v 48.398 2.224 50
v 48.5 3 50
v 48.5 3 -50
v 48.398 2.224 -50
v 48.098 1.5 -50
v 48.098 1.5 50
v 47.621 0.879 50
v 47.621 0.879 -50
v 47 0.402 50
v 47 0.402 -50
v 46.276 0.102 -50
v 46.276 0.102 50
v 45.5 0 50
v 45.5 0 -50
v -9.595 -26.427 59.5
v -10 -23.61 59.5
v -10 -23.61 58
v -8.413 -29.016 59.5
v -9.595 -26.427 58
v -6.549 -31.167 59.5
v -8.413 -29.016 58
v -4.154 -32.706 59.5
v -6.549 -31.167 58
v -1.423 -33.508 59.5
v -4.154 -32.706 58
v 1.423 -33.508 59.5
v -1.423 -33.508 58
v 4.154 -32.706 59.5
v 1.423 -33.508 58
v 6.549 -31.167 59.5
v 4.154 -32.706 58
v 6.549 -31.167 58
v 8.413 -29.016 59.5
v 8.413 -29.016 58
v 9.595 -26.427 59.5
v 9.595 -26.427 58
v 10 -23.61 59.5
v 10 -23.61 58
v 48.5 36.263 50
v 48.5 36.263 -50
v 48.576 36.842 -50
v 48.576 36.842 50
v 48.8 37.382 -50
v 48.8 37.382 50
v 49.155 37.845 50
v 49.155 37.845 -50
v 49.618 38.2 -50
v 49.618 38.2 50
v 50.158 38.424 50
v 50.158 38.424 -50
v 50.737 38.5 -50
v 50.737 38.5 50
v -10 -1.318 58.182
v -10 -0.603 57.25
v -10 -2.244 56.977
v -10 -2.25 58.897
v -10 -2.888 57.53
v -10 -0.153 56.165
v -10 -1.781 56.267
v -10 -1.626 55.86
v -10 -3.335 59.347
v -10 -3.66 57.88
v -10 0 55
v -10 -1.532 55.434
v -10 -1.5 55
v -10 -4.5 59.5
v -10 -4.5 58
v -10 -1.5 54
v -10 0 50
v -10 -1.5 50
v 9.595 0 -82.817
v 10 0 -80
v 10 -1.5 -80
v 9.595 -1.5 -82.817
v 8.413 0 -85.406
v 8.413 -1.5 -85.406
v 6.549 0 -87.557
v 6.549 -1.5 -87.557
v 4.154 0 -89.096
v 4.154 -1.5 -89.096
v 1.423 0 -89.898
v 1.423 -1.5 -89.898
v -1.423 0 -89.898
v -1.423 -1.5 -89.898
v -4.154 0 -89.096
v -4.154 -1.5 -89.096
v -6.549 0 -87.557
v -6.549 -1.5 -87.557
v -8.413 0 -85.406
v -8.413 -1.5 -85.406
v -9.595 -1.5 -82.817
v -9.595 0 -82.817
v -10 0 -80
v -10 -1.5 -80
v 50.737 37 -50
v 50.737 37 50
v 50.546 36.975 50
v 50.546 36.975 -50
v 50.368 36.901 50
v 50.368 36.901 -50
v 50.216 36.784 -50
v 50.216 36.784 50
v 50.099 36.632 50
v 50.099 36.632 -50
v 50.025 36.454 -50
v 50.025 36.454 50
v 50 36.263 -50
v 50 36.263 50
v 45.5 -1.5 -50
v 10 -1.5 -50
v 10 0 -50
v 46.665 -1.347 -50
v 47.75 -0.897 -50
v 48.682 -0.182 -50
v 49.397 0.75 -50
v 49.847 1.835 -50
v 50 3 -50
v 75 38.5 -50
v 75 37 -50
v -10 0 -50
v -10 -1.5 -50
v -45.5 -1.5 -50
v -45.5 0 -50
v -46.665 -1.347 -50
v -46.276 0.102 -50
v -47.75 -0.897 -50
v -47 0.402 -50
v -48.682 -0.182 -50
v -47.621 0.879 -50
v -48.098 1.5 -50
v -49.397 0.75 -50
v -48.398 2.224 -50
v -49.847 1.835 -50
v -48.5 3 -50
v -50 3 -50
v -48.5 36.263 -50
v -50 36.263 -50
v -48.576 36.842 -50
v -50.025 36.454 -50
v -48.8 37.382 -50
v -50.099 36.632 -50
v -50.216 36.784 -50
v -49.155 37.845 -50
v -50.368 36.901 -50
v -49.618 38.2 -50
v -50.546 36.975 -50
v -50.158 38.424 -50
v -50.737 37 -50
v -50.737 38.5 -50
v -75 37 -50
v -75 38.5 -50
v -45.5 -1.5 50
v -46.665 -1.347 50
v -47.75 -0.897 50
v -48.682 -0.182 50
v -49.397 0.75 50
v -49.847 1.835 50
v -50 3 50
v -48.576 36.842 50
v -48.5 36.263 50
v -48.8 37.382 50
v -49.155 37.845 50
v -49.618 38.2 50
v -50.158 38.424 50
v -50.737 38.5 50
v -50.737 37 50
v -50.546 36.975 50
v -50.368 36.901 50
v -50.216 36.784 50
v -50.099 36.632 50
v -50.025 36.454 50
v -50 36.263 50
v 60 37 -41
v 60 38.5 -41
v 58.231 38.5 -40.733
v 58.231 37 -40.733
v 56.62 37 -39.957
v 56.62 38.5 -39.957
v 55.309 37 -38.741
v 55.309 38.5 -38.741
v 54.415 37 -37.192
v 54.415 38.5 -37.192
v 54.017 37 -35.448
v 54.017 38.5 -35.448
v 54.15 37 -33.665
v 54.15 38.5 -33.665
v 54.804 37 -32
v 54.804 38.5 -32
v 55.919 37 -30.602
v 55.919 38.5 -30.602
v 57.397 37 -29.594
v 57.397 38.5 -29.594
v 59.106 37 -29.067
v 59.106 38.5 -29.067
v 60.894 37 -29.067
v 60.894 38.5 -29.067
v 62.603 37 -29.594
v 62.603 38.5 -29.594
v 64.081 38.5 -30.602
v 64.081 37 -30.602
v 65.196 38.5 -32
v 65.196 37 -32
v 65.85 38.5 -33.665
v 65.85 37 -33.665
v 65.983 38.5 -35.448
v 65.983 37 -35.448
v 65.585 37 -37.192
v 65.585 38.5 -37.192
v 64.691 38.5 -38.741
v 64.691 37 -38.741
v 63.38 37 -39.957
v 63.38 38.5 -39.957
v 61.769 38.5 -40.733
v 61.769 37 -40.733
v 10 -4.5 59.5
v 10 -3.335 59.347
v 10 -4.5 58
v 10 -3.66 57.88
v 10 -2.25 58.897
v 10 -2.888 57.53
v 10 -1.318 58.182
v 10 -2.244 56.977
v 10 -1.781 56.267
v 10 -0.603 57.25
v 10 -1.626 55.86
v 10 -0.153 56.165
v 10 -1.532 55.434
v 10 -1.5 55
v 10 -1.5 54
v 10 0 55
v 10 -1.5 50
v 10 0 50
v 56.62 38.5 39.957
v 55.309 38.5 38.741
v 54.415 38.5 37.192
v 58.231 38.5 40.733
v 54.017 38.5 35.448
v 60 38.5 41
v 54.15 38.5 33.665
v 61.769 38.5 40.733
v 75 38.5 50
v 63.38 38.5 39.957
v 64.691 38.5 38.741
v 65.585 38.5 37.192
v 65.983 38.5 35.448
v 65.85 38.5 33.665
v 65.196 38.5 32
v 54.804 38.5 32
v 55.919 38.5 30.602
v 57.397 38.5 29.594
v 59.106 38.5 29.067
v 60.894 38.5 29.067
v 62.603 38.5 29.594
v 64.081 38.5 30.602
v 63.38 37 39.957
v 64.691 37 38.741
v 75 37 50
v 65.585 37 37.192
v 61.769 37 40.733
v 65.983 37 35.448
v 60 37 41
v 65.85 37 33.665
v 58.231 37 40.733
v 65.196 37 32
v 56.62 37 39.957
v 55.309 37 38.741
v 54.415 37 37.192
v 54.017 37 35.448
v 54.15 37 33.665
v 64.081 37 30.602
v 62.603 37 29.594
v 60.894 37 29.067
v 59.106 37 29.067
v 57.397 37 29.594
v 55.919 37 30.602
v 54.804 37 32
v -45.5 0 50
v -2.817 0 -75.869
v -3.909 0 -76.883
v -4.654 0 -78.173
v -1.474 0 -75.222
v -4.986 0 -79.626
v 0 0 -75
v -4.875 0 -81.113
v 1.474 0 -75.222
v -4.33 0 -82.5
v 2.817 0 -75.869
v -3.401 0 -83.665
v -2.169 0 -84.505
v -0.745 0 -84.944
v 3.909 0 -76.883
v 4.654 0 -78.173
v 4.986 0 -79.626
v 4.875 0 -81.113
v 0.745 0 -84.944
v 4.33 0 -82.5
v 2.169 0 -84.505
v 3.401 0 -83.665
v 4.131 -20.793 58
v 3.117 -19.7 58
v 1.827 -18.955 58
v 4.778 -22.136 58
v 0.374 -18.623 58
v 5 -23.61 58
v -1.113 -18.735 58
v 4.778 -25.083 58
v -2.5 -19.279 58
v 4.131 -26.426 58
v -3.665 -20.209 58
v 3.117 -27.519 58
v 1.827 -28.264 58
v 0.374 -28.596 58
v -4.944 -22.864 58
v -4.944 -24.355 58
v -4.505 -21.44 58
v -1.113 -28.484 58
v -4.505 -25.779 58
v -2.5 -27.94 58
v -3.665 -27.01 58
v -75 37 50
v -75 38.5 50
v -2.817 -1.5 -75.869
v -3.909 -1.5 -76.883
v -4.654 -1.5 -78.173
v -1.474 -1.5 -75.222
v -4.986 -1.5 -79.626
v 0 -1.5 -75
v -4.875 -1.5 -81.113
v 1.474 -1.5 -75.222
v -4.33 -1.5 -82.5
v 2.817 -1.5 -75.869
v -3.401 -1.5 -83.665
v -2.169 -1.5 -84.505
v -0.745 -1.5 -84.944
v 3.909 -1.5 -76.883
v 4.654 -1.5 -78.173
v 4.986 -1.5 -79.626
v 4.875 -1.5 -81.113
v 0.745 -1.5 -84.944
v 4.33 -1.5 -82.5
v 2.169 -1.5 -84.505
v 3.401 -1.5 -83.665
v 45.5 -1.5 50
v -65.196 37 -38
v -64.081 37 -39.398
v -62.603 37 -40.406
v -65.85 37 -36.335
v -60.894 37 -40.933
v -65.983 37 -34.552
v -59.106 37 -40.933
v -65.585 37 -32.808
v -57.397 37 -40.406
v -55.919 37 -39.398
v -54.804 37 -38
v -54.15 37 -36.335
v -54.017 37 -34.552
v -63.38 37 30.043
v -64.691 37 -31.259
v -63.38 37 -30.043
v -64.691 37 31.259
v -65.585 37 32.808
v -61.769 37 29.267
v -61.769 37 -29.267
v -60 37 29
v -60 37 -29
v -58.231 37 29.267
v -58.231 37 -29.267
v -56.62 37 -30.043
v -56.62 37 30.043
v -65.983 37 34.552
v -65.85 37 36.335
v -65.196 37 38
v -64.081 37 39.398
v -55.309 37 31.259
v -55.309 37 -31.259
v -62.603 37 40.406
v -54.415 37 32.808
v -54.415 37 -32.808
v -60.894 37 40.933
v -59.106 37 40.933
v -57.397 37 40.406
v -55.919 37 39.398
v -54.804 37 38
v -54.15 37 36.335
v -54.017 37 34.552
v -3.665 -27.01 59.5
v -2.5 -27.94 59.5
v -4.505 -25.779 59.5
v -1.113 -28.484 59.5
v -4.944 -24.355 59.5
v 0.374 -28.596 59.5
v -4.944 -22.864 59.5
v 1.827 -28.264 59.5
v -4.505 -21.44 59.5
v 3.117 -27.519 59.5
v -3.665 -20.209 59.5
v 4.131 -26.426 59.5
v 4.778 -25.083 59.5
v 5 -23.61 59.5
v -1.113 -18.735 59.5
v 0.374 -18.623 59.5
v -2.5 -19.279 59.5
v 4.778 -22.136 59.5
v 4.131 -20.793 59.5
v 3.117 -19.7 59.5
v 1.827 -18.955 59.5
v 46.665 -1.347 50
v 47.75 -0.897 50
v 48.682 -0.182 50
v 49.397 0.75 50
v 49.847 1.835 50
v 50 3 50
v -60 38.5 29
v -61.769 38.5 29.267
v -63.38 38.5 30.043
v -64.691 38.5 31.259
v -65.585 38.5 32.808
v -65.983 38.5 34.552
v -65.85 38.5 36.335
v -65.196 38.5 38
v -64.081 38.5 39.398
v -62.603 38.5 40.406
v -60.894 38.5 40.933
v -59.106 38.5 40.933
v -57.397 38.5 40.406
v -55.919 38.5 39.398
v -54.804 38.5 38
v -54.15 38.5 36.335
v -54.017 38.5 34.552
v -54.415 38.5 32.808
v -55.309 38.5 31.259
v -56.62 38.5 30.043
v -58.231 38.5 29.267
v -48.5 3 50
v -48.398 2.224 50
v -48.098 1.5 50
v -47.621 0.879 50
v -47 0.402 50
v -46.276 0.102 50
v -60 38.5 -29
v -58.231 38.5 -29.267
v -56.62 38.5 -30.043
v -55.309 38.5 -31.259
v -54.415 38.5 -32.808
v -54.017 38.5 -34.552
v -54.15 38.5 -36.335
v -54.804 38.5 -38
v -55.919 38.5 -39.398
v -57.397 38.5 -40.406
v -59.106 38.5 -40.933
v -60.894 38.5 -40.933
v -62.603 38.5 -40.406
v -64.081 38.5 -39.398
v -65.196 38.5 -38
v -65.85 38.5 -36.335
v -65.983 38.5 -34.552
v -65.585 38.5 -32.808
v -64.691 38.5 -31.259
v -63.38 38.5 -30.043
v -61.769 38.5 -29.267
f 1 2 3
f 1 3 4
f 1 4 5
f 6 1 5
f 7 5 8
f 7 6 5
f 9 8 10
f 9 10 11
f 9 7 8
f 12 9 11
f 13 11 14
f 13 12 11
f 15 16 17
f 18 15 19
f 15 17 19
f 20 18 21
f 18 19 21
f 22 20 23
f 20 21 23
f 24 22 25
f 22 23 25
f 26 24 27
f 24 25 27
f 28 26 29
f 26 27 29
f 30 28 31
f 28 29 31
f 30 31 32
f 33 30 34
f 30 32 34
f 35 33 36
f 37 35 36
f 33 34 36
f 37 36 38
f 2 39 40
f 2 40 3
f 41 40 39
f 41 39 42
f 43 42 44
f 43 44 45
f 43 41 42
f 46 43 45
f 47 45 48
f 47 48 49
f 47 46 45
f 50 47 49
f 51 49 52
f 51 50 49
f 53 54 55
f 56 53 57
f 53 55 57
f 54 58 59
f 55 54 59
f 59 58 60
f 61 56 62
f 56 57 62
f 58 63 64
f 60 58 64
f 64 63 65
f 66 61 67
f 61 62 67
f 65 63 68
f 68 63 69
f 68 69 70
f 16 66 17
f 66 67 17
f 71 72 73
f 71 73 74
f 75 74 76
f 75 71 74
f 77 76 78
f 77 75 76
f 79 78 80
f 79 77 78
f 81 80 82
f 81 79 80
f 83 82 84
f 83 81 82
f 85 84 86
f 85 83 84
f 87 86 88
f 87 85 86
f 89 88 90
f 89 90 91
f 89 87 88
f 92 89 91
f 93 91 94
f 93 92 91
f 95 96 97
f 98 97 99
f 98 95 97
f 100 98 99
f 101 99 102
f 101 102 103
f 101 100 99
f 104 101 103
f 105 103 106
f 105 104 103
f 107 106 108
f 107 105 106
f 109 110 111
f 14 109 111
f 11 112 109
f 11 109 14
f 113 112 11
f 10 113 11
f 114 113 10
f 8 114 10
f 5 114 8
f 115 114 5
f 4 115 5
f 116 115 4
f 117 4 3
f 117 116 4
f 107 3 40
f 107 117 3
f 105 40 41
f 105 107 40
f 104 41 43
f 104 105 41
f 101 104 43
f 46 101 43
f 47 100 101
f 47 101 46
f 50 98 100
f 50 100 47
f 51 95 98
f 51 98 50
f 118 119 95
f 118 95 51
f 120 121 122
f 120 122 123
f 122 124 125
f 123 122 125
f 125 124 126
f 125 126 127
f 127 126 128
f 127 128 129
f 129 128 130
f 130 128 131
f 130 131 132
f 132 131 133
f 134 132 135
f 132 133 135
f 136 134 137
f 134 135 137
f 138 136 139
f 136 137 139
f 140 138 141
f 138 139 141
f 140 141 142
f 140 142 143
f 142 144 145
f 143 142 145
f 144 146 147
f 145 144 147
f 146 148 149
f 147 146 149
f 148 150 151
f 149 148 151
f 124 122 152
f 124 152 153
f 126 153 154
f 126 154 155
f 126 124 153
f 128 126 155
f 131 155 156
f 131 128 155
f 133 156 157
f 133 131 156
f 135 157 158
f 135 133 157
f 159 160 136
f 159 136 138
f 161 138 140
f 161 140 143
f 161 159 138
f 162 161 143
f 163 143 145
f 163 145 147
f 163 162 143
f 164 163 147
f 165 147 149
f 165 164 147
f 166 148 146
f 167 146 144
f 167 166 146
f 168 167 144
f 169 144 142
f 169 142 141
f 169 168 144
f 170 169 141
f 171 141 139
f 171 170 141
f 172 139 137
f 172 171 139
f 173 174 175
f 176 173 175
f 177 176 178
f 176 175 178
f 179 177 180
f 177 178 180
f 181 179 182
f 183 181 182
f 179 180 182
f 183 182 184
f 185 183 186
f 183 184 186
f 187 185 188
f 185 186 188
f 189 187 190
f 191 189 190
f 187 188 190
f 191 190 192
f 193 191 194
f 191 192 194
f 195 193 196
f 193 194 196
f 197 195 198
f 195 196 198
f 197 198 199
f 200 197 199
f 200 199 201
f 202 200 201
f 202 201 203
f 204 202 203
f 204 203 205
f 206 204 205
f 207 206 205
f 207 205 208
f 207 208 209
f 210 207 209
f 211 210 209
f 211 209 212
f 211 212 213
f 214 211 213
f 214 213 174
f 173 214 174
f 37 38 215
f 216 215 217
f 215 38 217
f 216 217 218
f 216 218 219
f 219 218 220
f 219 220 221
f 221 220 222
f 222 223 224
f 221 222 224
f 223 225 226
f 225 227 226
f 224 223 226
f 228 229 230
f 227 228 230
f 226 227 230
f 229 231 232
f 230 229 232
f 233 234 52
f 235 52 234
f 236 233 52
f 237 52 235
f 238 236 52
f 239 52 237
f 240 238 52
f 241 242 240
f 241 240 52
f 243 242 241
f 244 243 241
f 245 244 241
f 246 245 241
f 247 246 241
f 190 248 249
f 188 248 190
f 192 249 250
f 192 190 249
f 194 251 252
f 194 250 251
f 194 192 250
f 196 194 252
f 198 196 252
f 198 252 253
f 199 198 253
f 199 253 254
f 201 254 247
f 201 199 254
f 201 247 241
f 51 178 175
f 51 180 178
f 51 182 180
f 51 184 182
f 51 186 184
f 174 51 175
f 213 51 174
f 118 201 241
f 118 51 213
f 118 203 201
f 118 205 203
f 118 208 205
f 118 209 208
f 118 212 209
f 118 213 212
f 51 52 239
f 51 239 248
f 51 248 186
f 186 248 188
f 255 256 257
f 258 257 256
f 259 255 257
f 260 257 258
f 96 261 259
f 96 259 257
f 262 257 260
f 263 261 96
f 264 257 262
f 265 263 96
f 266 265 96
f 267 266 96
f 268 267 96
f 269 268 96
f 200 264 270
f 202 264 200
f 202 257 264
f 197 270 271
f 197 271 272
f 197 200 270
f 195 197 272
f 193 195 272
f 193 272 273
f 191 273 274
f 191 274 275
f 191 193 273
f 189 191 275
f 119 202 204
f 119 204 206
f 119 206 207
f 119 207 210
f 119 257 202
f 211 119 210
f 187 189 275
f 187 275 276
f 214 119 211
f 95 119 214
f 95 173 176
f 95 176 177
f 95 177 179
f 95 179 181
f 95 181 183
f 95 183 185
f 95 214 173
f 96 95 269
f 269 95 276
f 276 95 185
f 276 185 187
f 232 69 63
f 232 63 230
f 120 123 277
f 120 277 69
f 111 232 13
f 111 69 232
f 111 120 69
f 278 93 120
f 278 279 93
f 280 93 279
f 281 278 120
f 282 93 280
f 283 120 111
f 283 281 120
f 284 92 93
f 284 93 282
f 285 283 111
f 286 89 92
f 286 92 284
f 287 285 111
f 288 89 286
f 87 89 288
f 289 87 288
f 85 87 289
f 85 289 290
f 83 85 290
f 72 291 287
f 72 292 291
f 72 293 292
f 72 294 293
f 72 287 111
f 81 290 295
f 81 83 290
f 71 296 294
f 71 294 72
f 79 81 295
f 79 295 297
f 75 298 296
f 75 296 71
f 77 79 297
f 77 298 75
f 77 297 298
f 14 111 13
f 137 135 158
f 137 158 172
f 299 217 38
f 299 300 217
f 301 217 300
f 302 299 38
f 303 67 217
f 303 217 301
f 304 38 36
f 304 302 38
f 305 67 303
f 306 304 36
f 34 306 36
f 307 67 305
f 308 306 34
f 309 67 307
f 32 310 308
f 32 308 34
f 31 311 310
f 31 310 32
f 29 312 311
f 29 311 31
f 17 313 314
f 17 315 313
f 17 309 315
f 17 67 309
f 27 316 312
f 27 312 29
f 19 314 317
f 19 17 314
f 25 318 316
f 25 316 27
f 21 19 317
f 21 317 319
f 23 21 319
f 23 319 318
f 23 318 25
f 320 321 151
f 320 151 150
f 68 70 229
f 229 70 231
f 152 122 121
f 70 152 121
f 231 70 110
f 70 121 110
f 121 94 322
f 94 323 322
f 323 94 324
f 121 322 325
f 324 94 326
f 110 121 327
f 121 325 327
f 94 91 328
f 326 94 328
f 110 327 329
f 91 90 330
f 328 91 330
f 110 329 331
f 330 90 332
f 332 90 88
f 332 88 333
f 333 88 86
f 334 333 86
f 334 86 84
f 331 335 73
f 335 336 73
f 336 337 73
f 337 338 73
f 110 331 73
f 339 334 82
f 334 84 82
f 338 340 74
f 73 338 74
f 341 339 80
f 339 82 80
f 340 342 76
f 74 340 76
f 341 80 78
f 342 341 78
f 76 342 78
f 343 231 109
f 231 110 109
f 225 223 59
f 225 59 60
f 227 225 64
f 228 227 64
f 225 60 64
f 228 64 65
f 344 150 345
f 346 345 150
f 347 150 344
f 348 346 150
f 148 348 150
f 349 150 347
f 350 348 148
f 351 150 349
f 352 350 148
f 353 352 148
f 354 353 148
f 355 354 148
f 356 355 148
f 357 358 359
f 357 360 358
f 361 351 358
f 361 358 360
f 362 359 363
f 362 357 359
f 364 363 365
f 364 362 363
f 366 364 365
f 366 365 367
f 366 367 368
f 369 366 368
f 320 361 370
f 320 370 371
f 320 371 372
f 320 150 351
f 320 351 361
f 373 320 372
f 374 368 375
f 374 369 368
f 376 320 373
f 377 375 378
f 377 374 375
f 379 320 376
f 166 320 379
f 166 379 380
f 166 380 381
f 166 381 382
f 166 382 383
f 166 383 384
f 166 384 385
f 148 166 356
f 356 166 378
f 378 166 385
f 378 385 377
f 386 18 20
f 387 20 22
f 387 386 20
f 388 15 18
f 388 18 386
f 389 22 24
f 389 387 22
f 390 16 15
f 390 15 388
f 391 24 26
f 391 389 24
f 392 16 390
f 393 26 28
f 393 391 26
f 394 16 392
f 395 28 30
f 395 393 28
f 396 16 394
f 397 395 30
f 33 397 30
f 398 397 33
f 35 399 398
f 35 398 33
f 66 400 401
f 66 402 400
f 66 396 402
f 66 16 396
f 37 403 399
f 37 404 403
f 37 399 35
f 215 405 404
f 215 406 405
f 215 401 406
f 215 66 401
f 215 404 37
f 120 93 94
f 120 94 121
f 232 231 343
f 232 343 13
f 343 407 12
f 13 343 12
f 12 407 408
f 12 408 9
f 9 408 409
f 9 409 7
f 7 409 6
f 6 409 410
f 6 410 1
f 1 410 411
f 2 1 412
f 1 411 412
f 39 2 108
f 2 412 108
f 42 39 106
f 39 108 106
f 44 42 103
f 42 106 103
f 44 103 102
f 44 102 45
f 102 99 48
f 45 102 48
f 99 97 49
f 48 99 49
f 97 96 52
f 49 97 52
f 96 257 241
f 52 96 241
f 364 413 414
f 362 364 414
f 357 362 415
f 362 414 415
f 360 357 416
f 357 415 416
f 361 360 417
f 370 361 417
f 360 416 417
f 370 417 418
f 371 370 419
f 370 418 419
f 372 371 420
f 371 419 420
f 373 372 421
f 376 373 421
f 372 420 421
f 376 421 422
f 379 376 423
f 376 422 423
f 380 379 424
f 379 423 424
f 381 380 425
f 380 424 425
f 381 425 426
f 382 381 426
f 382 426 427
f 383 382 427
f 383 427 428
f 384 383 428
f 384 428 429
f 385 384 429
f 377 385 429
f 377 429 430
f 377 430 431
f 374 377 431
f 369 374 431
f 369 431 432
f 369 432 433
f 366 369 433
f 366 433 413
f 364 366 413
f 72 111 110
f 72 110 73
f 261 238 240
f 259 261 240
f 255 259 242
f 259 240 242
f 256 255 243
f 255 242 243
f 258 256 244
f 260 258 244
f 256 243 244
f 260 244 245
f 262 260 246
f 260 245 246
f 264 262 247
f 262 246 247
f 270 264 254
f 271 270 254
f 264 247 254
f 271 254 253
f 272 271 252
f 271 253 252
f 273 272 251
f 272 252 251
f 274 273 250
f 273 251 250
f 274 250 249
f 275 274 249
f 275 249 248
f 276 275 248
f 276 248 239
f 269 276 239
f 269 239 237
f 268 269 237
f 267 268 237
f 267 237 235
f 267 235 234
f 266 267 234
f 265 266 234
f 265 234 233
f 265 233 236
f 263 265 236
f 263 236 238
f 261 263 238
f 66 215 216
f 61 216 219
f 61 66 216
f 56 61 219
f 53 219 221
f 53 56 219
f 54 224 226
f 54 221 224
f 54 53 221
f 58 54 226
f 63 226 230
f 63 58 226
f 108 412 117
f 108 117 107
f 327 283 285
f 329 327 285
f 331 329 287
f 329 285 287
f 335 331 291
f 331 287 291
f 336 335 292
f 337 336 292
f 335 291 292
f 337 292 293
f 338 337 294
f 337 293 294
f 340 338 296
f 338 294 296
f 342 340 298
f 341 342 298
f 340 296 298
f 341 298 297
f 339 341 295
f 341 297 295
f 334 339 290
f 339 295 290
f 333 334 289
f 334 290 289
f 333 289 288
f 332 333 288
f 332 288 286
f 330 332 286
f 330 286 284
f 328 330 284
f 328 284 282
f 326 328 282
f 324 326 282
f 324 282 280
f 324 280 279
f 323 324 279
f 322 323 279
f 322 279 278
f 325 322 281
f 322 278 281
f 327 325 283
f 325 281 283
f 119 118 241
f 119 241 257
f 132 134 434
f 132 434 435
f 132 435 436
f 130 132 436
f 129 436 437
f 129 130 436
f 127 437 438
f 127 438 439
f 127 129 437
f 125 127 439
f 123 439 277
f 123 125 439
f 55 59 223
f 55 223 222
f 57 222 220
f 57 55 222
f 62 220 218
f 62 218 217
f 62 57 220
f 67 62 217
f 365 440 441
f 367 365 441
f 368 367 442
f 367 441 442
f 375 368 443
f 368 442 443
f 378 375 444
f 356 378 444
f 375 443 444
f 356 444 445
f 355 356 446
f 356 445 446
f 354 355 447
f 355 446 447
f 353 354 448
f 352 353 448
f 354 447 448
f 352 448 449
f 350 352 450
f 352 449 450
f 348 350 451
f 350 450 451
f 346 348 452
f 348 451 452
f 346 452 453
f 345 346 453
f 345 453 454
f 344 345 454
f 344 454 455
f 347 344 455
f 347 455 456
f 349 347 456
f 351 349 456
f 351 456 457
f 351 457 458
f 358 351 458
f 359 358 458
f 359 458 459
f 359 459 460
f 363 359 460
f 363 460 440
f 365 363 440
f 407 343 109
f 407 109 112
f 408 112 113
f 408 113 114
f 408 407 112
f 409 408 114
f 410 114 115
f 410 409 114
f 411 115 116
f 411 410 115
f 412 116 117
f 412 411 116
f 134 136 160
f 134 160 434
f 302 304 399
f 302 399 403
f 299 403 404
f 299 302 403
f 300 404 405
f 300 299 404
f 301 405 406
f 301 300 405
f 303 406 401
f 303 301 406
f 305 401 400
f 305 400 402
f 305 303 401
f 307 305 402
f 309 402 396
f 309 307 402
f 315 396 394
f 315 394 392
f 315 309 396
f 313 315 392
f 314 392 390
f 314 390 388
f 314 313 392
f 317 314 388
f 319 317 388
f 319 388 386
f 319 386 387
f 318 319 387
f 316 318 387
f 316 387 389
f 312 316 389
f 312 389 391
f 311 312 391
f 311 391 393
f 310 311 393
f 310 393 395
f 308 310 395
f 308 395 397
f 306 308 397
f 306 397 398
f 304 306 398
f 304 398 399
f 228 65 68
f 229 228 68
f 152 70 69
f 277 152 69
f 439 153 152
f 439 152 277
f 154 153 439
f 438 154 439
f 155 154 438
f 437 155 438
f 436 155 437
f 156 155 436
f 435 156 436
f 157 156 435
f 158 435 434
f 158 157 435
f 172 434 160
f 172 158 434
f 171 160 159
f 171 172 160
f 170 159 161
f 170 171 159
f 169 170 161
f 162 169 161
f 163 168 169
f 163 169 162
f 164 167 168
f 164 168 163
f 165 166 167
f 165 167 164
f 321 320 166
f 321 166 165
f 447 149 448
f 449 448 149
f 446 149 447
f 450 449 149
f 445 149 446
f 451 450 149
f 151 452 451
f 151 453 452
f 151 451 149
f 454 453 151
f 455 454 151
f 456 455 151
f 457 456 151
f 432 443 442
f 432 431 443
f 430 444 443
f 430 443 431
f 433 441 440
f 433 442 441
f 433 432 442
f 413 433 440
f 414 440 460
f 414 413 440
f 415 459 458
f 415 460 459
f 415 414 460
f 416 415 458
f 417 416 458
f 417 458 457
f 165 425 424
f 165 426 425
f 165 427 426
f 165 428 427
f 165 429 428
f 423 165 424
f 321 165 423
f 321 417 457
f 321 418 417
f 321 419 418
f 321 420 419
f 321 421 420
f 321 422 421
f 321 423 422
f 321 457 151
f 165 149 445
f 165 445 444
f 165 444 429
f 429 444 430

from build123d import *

# Parameters (mm, degrees)
SCHIZZO1_R                           = 5
BASE_FLANGIA1_DEPTH                  = 1.5
BORDO_FLANGIA1_STRIP_W               = 12
BORDO_FLANGIA1_STRIP_H               = 1.5
BORDO_FLANGIA1_STRIP_CUT_DEPTH       = 100
BORDO_FLANGIA1_STRIP_2_W             = 12
BORDO_FLANGIA1_STRIP_2_H             = 1.5
BORDO_FLANGIA1_STRIP_CUT_2_DEPTH     = 100
BORDO_FLANGIA1_DEPTH                 = 100
BORDO_FLANGIA1_BEND_DEPTH            = 100
BORDO_FLANGIA2_STRIP_W               = 7.4732
BORDO_FLANGIA2_STRIP_H               = 1.5
BORDO_FLANGIA2_STRIP_CUT_DEPTH       = 100
BORDO_FLANGIA2_STRIP_2_W             = 7.4732
BORDO_FLANGIA2_STRIP_2_H             = 1.5
BORDO_FLANGIA2_STRIP_CUT_2_DEPTH     = 100
BORDO_FLANGIA2_DEPTH                 = 100
BORDO_FLANGIA2_BEND_DEPTH            = 100
PIEGATURA_START                      = 58.9178
PIEGATURA_DELLO_SCHIZZO1_OUTLINE_W   = 20
PIEGATURA_DELLO_SCHIZZO1_OUTLINE_H   = 1.5
PIEGATURA_DELLO_SCHIZZO1_DEPTH       = 32.0822
PIEGATURA_START_2                    = 56.266894772
PIEGATURA_DELLO_SCHIZZO1_2_OUTLINE_R = 5
PIEGATURA_DELLO_SCHIZZO1_2_DEPTH     = 3.233105228
PIEGATURA_START_3                    = -10
PIEGATURA_DELLO_SCHIZZO1_3_DEPTH     = 20
PIEGATURA_DELLO_SCHIZZO1_4_DEPTH     = 20
SCHIZZO19_R                          = 6
TAGLIO_ESTRUSIONE1_DEPTH             = 138.567372501


with BuildPart() as part:
    # Base-Flangia1: sheet metal written as solids
    # Schizzo1 → Base-Flangia1 (new body)
    with BuildSketch(Plane(origin=(0, 0, 0), x_dir=(1, 0, 0), z_dir=(0, 1, 0))):
        with BuildLine():
            Line((10, 50), (10, 80))
            ThreePointArc((10, 80), (0, 90), (-10, 80))
            Line((-10, 80), (-10, 50))
            Line((-10, 50), (-50, 50))
            Line((-50, 50), (-50, -50))
            Line((-50, -50), (-10, -50))
            Line((-10, -50), (-10, -80))
            ThreePointArc((-10, -80), (0, -90), (10, -80))
            Line((10, -80), (10, -50))
            Line((10, -50), (50, -50))
            Line((50, -50), (50, 50))
            Line((50, 50), (10, 50))
        make_face()
        with Locations(Location((0, 80, 0), (0, 0, 270))):
            Circle(SCHIZZO1_R, mode=Mode.SUBTRACT)
        with Locations(Location((0, -80, 0), (0, 0, 270))):
            Circle(SCHIZZO1_R, mode=Mode.SUBTRACT)
    extrude(amount=-BASE_FLANGIA1_DEPTH)

    # Bordo-Flangia1: sheet metal written as solids
    # Bordo-Flangia1 strip (on a plane across the edge) → Bordo-Flangia1 strip cut (cut)
    with BuildSketch(Plane(origin=(-50, 0, -50), x_dir=(1, 0, 0), z_dir=(0, 0, 1))):
        with Locations((-1.5, -0.75)):
            Rectangle(BORDO_FLANGIA1_STRIP_W, BORDO_FLANGIA1_STRIP_H)
    extrude(amount=BORDO_FLANGIA1_STRIP_CUT_DEPTH, mode=Mode.SUBTRACT)

    # Bordo-Flangia1 strip 2 (on a plane across the edge) → Bordo-Flangia1 strip cut 2 (cut)
    with BuildSketch(Plane(origin=(50, 0, 50), x_dir=(-1, 0, 0), z_dir=(0, 0, -1))):
        with Locations((-1.5, -0.75)):
            Rectangle(BORDO_FLANGIA1_STRIP_2_W, BORDO_FLANGIA1_STRIP_2_H)
    extrude(amount=BORDO_FLANGIA1_STRIP_CUT_2_DEPTH, mode=Mode.SUBTRACT)

    # Bordo-Flangia1 section (on a plane across the edge) → Bordo-Flangia1 (add)
    with BuildSketch(Plane(origin=(-50, 0, -50), x_dir=(1, 0, 0), z_dir=(0, 0, 1))):
        with BuildLine():
            Line((0, 3), (0, 38.5))
            Line((0, 38.5), (1.5, 38.5))
            Line((1.5, 38.5), (1.5, 3))
            ThreePointArc((1.5, 3), (2.378679656, 0.878679656), (4.5, 0))
            Line((4.5, 0), (4.5, -1.5))
            ThreePointArc((4.5, -1.5), (1.318019485, -0.181980515), (0, 3))
        make_face()
    extrude(amount=BORDO_FLANGIA1_DEPTH)

    # Bordo-Flangia1 section 2 (on a plane across the edge) → Bordo-Flangia1 bend (add)
    with BuildSketch(Plane(origin=(50, 0, 50), x_dir=(-1, 0, 0), z_dir=(0, 0, -1))):
        with BuildLine():
            Line((0, 3), (0, 38.5))
            Line((0, 38.5), (1.5, 38.5))
            Line((1.5, 38.5), (1.5, 3))
            ThreePointArc((1.5, 3), (2.378679656, 0.878679656), (4.5, 0))
            Line((4.5, 0), (4.5, -1.5))
            ThreePointArc((4.5, -1.5), (1.318019485, -0.181980515), (0, 3))
        make_face()
    extrude(amount=BORDO_FLANGIA1_BEND_DEPTH)

    # Bordo-Flangia2: sheet metal written as solids
    # Bordo-Flangia2 strip (on a plane across the edge) → Bordo-Flangia2 strip cut (cut)
    with BuildSketch(Plane(origin=(50, 38.5, -50), x_dir=(0, -1, 0), z_dir=(0, 0, 1))):
        with Locations((-1.5, -0.75)):
            Rectangle(BORDO_FLANGIA2_STRIP_W, BORDO_FLANGIA2_STRIP_H)
    extrude(amount=BORDO_FLANGIA2_STRIP_CUT_DEPTH, mode=Mode.SUBTRACT)

    # Bordo-Flangia2 strip 2 (on a plane across the edge) → Bordo-Flangia2 strip cut 2 (cut)
    with BuildSketch(Plane(origin=(-50, 38.5, 50), x_dir=(0, -1, 0), z_dir=(0, 0, -1))):
        with Locations((-1.5, -0.75)):
            Rectangle(BORDO_FLANGIA2_STRIP_2_W, BORDO_FLANGIA2_STRIP_2_H)
    extrude(amount=BORDO_FLANGIA2_STRIP_CUT_2_DEPTH, mode=Mode.SUBTRACT)

    # Bordo-Flangia2 section (on a plane across the edge) → Bordo-Flangia2 (add)
    with BuildSketch(Plane(origin=(50, 38.5, -50), x_dir=(0, -1, 0), z_dir=(0, 0, 1))):
        with BuildLine():
            Line((0, 0.7366), (0, 25))
            Line((0, 25), (1.5, 25))
            Line((1.5, 25), (1.5, 0.7366))
            ThreePointArc((1.5, 0.7366), (1.715745145, 0.215745145), (2.2366, 0))
            Line((2.2366, 0), (2.2366, -1.5))
            ThreePointArc((2.2366, -1.5), (0.655084973, -0.844915027), (0, 0.7366))
        make_face()
    extrude(amount=BORDO_FLANGIA2_DEPTH)

    # Bordo-Flangia2 section 2 (on a plane across the edge) → Bordo-Flangia2 bend (add)
    with BuildSketch(Plane(origin=(-50, 38.5, 50), x_dir=(0, -1, 0), z_dir=(0, 0, -1))):
        with BuildLine():
            Line((0, 0.7366), (0, 25))
            Line((0, 25), (1.5, 25))
            Line((1.5, 25), (1.5, 0.7366))
            ThreePointArc((1.5, 0.7366), (1.715745145, 0.215745145), (2.2366, 0))
            Line((2.2366, 0), (2.2366, -1.5))
            ThreePointArc((2.2366, -1.5), (0.655084973, -0.844915027), (0, 0.7366))
        make_face()
    extrude(amount=BORDO_FLANGIA2_BEND_DEPTH)

    # Piegatura dello schizzo1: read off the stored shape, not the designer's step
    # Piegatura dello schizzo1 outline → Piegatura dello schizzo1 (cut)
    with BuildSketch(Plane.XY.offset(PIEGATURA_START)):
        with Locations((0, -0.75)):
            Rectangle(PIEGATURA_DELLO_SCHIZZO1_OUTLINE_W, PIEGATURA_DELLO_SCHIZZO1_OUTLINE_H)
    extrude(amount=PIEGATURA_DELLO_SCHIZZO1_DEPTH, mode=Mode.SUBTRACT)

    # Piegatura dello schizzo1 2 outline → Piegatura dello schizzo1 2 (add)
    with BuildSketch(Plane.XY.offset(PIEGATURA_START_2)):
        with BuildLine():
            Line((10, -23.609513775), (10, -1.5))
            Line((10, -1.5), (-10, -1.5))
            Line((-10, -1.5), (-10, -23.609513775))
            ThreePointArc((-10, -23.609513775), (0, -33.609513775), (10, -23.609513775))
        make_face()
        with Locations((0, -23.609513775)):
            Circle(PIEGATURA_DELLO_SCHIZZO1_2_OUTLINE_R, mode=Mode.SUBTRACT)
    extrude(amount=PIEGATURA_DELLO_SCHIZZO1_2_DEPTH)

    # Piegatura dello schizzo1 3 outline → Piegatura dello schizzo1 3 (cut)
    with BuildSketch(Plane.YZ.offset(PIEGATURA_START_3)):
        with BuildLine():
            ThreePointArc((-1.780629183, 56.266894772), (-2.887654552, 57.529889753), (-4.5, 58))
            Line((-4.5, 58), (-35, 58))
            Line((-35, 58), (-35, 56.266894772))
            Line((-35, 56.266894772), (-1.780629183, 56.266894772))
        make_face()
        with BuildLine():
            Line((1, 54), (1, 58.9178))
            Line((1, 58.9178), (-1.5, 58.9178))
            Line((-1.5, 58.9178), (-1.5, 61))
            Line((-1.5, 61), (-35, 61))
            Line((-35, 61), (-35, 59.500000008))
            Line((-35, 59.500000008), (-4.5, 59.5))
            ThreePointArc((-4.5, 59.5), (-1.318019485, 58.181980515), (0, 55))
            Line((0, 55), (0, 54))
            Line((0, 54), (1, 54))
        make_face()
    extrude(amount=PIEGATURA_DELLO_SCHIZZO1_3_DEPTH, mode=Mode.SUBTRACT)

    # Piegatura dello schizzo1 4 outline → Piegatura dello schizzo1 4 (add)
    with BuildSketch(Plane.YZ.offset(PIEGATURA_START_3)):
        with BuildLine():
            Line((-0.182016948, 56.266894772), (-1.780629183, 56.266894772))
            ThreePointArc((-1.780629183, 56.266894772), (-1.570997401, 55.6488018), (-1.5, 55))
            Line((-1.5, 55), (-1.500000001, 54))
            Line((-1.500000001, 54), (0, 54))
            Line((0, 54), (0, 55))
            ThreePointArc((0, 55), (-0.045736664, 55.639951665), (-0.182016948, 56.266894772))
        make_face()
    extrude(amount=PIEGATURA_DELLO_SCHIZZO1_4_DEPTH)

    # Schizzo19 → Taglio-Estrusione1 (cut, through all)
    with BuildSketch(Plane(origin=(0, 38.5, 0), x_dir=(1, 0, 0), z_dir=(0, 1, 0))):
        with Locations(Location((-60, 35, 0), (0, 0, 270))):
            Circle(SCHIZZO19_R)
        with Locations(Location((-60, -35, 0), (0, 0, 90))):
            Circle(SCHIZZO19_R)
        with Locations(Location((60, -35, 0), (0, 0, 270))):
            Circle(SCHIZZO19_R)
        with Locations(Location((60, 35, 0), (0, 0, 90))):
            Circle(SCHIZZO19_R)
    extrude(amount=-TAGLIO_ESTRUSIONE1_DEPTH, mode=Mode.SUBTRACT)


solid = part.part
